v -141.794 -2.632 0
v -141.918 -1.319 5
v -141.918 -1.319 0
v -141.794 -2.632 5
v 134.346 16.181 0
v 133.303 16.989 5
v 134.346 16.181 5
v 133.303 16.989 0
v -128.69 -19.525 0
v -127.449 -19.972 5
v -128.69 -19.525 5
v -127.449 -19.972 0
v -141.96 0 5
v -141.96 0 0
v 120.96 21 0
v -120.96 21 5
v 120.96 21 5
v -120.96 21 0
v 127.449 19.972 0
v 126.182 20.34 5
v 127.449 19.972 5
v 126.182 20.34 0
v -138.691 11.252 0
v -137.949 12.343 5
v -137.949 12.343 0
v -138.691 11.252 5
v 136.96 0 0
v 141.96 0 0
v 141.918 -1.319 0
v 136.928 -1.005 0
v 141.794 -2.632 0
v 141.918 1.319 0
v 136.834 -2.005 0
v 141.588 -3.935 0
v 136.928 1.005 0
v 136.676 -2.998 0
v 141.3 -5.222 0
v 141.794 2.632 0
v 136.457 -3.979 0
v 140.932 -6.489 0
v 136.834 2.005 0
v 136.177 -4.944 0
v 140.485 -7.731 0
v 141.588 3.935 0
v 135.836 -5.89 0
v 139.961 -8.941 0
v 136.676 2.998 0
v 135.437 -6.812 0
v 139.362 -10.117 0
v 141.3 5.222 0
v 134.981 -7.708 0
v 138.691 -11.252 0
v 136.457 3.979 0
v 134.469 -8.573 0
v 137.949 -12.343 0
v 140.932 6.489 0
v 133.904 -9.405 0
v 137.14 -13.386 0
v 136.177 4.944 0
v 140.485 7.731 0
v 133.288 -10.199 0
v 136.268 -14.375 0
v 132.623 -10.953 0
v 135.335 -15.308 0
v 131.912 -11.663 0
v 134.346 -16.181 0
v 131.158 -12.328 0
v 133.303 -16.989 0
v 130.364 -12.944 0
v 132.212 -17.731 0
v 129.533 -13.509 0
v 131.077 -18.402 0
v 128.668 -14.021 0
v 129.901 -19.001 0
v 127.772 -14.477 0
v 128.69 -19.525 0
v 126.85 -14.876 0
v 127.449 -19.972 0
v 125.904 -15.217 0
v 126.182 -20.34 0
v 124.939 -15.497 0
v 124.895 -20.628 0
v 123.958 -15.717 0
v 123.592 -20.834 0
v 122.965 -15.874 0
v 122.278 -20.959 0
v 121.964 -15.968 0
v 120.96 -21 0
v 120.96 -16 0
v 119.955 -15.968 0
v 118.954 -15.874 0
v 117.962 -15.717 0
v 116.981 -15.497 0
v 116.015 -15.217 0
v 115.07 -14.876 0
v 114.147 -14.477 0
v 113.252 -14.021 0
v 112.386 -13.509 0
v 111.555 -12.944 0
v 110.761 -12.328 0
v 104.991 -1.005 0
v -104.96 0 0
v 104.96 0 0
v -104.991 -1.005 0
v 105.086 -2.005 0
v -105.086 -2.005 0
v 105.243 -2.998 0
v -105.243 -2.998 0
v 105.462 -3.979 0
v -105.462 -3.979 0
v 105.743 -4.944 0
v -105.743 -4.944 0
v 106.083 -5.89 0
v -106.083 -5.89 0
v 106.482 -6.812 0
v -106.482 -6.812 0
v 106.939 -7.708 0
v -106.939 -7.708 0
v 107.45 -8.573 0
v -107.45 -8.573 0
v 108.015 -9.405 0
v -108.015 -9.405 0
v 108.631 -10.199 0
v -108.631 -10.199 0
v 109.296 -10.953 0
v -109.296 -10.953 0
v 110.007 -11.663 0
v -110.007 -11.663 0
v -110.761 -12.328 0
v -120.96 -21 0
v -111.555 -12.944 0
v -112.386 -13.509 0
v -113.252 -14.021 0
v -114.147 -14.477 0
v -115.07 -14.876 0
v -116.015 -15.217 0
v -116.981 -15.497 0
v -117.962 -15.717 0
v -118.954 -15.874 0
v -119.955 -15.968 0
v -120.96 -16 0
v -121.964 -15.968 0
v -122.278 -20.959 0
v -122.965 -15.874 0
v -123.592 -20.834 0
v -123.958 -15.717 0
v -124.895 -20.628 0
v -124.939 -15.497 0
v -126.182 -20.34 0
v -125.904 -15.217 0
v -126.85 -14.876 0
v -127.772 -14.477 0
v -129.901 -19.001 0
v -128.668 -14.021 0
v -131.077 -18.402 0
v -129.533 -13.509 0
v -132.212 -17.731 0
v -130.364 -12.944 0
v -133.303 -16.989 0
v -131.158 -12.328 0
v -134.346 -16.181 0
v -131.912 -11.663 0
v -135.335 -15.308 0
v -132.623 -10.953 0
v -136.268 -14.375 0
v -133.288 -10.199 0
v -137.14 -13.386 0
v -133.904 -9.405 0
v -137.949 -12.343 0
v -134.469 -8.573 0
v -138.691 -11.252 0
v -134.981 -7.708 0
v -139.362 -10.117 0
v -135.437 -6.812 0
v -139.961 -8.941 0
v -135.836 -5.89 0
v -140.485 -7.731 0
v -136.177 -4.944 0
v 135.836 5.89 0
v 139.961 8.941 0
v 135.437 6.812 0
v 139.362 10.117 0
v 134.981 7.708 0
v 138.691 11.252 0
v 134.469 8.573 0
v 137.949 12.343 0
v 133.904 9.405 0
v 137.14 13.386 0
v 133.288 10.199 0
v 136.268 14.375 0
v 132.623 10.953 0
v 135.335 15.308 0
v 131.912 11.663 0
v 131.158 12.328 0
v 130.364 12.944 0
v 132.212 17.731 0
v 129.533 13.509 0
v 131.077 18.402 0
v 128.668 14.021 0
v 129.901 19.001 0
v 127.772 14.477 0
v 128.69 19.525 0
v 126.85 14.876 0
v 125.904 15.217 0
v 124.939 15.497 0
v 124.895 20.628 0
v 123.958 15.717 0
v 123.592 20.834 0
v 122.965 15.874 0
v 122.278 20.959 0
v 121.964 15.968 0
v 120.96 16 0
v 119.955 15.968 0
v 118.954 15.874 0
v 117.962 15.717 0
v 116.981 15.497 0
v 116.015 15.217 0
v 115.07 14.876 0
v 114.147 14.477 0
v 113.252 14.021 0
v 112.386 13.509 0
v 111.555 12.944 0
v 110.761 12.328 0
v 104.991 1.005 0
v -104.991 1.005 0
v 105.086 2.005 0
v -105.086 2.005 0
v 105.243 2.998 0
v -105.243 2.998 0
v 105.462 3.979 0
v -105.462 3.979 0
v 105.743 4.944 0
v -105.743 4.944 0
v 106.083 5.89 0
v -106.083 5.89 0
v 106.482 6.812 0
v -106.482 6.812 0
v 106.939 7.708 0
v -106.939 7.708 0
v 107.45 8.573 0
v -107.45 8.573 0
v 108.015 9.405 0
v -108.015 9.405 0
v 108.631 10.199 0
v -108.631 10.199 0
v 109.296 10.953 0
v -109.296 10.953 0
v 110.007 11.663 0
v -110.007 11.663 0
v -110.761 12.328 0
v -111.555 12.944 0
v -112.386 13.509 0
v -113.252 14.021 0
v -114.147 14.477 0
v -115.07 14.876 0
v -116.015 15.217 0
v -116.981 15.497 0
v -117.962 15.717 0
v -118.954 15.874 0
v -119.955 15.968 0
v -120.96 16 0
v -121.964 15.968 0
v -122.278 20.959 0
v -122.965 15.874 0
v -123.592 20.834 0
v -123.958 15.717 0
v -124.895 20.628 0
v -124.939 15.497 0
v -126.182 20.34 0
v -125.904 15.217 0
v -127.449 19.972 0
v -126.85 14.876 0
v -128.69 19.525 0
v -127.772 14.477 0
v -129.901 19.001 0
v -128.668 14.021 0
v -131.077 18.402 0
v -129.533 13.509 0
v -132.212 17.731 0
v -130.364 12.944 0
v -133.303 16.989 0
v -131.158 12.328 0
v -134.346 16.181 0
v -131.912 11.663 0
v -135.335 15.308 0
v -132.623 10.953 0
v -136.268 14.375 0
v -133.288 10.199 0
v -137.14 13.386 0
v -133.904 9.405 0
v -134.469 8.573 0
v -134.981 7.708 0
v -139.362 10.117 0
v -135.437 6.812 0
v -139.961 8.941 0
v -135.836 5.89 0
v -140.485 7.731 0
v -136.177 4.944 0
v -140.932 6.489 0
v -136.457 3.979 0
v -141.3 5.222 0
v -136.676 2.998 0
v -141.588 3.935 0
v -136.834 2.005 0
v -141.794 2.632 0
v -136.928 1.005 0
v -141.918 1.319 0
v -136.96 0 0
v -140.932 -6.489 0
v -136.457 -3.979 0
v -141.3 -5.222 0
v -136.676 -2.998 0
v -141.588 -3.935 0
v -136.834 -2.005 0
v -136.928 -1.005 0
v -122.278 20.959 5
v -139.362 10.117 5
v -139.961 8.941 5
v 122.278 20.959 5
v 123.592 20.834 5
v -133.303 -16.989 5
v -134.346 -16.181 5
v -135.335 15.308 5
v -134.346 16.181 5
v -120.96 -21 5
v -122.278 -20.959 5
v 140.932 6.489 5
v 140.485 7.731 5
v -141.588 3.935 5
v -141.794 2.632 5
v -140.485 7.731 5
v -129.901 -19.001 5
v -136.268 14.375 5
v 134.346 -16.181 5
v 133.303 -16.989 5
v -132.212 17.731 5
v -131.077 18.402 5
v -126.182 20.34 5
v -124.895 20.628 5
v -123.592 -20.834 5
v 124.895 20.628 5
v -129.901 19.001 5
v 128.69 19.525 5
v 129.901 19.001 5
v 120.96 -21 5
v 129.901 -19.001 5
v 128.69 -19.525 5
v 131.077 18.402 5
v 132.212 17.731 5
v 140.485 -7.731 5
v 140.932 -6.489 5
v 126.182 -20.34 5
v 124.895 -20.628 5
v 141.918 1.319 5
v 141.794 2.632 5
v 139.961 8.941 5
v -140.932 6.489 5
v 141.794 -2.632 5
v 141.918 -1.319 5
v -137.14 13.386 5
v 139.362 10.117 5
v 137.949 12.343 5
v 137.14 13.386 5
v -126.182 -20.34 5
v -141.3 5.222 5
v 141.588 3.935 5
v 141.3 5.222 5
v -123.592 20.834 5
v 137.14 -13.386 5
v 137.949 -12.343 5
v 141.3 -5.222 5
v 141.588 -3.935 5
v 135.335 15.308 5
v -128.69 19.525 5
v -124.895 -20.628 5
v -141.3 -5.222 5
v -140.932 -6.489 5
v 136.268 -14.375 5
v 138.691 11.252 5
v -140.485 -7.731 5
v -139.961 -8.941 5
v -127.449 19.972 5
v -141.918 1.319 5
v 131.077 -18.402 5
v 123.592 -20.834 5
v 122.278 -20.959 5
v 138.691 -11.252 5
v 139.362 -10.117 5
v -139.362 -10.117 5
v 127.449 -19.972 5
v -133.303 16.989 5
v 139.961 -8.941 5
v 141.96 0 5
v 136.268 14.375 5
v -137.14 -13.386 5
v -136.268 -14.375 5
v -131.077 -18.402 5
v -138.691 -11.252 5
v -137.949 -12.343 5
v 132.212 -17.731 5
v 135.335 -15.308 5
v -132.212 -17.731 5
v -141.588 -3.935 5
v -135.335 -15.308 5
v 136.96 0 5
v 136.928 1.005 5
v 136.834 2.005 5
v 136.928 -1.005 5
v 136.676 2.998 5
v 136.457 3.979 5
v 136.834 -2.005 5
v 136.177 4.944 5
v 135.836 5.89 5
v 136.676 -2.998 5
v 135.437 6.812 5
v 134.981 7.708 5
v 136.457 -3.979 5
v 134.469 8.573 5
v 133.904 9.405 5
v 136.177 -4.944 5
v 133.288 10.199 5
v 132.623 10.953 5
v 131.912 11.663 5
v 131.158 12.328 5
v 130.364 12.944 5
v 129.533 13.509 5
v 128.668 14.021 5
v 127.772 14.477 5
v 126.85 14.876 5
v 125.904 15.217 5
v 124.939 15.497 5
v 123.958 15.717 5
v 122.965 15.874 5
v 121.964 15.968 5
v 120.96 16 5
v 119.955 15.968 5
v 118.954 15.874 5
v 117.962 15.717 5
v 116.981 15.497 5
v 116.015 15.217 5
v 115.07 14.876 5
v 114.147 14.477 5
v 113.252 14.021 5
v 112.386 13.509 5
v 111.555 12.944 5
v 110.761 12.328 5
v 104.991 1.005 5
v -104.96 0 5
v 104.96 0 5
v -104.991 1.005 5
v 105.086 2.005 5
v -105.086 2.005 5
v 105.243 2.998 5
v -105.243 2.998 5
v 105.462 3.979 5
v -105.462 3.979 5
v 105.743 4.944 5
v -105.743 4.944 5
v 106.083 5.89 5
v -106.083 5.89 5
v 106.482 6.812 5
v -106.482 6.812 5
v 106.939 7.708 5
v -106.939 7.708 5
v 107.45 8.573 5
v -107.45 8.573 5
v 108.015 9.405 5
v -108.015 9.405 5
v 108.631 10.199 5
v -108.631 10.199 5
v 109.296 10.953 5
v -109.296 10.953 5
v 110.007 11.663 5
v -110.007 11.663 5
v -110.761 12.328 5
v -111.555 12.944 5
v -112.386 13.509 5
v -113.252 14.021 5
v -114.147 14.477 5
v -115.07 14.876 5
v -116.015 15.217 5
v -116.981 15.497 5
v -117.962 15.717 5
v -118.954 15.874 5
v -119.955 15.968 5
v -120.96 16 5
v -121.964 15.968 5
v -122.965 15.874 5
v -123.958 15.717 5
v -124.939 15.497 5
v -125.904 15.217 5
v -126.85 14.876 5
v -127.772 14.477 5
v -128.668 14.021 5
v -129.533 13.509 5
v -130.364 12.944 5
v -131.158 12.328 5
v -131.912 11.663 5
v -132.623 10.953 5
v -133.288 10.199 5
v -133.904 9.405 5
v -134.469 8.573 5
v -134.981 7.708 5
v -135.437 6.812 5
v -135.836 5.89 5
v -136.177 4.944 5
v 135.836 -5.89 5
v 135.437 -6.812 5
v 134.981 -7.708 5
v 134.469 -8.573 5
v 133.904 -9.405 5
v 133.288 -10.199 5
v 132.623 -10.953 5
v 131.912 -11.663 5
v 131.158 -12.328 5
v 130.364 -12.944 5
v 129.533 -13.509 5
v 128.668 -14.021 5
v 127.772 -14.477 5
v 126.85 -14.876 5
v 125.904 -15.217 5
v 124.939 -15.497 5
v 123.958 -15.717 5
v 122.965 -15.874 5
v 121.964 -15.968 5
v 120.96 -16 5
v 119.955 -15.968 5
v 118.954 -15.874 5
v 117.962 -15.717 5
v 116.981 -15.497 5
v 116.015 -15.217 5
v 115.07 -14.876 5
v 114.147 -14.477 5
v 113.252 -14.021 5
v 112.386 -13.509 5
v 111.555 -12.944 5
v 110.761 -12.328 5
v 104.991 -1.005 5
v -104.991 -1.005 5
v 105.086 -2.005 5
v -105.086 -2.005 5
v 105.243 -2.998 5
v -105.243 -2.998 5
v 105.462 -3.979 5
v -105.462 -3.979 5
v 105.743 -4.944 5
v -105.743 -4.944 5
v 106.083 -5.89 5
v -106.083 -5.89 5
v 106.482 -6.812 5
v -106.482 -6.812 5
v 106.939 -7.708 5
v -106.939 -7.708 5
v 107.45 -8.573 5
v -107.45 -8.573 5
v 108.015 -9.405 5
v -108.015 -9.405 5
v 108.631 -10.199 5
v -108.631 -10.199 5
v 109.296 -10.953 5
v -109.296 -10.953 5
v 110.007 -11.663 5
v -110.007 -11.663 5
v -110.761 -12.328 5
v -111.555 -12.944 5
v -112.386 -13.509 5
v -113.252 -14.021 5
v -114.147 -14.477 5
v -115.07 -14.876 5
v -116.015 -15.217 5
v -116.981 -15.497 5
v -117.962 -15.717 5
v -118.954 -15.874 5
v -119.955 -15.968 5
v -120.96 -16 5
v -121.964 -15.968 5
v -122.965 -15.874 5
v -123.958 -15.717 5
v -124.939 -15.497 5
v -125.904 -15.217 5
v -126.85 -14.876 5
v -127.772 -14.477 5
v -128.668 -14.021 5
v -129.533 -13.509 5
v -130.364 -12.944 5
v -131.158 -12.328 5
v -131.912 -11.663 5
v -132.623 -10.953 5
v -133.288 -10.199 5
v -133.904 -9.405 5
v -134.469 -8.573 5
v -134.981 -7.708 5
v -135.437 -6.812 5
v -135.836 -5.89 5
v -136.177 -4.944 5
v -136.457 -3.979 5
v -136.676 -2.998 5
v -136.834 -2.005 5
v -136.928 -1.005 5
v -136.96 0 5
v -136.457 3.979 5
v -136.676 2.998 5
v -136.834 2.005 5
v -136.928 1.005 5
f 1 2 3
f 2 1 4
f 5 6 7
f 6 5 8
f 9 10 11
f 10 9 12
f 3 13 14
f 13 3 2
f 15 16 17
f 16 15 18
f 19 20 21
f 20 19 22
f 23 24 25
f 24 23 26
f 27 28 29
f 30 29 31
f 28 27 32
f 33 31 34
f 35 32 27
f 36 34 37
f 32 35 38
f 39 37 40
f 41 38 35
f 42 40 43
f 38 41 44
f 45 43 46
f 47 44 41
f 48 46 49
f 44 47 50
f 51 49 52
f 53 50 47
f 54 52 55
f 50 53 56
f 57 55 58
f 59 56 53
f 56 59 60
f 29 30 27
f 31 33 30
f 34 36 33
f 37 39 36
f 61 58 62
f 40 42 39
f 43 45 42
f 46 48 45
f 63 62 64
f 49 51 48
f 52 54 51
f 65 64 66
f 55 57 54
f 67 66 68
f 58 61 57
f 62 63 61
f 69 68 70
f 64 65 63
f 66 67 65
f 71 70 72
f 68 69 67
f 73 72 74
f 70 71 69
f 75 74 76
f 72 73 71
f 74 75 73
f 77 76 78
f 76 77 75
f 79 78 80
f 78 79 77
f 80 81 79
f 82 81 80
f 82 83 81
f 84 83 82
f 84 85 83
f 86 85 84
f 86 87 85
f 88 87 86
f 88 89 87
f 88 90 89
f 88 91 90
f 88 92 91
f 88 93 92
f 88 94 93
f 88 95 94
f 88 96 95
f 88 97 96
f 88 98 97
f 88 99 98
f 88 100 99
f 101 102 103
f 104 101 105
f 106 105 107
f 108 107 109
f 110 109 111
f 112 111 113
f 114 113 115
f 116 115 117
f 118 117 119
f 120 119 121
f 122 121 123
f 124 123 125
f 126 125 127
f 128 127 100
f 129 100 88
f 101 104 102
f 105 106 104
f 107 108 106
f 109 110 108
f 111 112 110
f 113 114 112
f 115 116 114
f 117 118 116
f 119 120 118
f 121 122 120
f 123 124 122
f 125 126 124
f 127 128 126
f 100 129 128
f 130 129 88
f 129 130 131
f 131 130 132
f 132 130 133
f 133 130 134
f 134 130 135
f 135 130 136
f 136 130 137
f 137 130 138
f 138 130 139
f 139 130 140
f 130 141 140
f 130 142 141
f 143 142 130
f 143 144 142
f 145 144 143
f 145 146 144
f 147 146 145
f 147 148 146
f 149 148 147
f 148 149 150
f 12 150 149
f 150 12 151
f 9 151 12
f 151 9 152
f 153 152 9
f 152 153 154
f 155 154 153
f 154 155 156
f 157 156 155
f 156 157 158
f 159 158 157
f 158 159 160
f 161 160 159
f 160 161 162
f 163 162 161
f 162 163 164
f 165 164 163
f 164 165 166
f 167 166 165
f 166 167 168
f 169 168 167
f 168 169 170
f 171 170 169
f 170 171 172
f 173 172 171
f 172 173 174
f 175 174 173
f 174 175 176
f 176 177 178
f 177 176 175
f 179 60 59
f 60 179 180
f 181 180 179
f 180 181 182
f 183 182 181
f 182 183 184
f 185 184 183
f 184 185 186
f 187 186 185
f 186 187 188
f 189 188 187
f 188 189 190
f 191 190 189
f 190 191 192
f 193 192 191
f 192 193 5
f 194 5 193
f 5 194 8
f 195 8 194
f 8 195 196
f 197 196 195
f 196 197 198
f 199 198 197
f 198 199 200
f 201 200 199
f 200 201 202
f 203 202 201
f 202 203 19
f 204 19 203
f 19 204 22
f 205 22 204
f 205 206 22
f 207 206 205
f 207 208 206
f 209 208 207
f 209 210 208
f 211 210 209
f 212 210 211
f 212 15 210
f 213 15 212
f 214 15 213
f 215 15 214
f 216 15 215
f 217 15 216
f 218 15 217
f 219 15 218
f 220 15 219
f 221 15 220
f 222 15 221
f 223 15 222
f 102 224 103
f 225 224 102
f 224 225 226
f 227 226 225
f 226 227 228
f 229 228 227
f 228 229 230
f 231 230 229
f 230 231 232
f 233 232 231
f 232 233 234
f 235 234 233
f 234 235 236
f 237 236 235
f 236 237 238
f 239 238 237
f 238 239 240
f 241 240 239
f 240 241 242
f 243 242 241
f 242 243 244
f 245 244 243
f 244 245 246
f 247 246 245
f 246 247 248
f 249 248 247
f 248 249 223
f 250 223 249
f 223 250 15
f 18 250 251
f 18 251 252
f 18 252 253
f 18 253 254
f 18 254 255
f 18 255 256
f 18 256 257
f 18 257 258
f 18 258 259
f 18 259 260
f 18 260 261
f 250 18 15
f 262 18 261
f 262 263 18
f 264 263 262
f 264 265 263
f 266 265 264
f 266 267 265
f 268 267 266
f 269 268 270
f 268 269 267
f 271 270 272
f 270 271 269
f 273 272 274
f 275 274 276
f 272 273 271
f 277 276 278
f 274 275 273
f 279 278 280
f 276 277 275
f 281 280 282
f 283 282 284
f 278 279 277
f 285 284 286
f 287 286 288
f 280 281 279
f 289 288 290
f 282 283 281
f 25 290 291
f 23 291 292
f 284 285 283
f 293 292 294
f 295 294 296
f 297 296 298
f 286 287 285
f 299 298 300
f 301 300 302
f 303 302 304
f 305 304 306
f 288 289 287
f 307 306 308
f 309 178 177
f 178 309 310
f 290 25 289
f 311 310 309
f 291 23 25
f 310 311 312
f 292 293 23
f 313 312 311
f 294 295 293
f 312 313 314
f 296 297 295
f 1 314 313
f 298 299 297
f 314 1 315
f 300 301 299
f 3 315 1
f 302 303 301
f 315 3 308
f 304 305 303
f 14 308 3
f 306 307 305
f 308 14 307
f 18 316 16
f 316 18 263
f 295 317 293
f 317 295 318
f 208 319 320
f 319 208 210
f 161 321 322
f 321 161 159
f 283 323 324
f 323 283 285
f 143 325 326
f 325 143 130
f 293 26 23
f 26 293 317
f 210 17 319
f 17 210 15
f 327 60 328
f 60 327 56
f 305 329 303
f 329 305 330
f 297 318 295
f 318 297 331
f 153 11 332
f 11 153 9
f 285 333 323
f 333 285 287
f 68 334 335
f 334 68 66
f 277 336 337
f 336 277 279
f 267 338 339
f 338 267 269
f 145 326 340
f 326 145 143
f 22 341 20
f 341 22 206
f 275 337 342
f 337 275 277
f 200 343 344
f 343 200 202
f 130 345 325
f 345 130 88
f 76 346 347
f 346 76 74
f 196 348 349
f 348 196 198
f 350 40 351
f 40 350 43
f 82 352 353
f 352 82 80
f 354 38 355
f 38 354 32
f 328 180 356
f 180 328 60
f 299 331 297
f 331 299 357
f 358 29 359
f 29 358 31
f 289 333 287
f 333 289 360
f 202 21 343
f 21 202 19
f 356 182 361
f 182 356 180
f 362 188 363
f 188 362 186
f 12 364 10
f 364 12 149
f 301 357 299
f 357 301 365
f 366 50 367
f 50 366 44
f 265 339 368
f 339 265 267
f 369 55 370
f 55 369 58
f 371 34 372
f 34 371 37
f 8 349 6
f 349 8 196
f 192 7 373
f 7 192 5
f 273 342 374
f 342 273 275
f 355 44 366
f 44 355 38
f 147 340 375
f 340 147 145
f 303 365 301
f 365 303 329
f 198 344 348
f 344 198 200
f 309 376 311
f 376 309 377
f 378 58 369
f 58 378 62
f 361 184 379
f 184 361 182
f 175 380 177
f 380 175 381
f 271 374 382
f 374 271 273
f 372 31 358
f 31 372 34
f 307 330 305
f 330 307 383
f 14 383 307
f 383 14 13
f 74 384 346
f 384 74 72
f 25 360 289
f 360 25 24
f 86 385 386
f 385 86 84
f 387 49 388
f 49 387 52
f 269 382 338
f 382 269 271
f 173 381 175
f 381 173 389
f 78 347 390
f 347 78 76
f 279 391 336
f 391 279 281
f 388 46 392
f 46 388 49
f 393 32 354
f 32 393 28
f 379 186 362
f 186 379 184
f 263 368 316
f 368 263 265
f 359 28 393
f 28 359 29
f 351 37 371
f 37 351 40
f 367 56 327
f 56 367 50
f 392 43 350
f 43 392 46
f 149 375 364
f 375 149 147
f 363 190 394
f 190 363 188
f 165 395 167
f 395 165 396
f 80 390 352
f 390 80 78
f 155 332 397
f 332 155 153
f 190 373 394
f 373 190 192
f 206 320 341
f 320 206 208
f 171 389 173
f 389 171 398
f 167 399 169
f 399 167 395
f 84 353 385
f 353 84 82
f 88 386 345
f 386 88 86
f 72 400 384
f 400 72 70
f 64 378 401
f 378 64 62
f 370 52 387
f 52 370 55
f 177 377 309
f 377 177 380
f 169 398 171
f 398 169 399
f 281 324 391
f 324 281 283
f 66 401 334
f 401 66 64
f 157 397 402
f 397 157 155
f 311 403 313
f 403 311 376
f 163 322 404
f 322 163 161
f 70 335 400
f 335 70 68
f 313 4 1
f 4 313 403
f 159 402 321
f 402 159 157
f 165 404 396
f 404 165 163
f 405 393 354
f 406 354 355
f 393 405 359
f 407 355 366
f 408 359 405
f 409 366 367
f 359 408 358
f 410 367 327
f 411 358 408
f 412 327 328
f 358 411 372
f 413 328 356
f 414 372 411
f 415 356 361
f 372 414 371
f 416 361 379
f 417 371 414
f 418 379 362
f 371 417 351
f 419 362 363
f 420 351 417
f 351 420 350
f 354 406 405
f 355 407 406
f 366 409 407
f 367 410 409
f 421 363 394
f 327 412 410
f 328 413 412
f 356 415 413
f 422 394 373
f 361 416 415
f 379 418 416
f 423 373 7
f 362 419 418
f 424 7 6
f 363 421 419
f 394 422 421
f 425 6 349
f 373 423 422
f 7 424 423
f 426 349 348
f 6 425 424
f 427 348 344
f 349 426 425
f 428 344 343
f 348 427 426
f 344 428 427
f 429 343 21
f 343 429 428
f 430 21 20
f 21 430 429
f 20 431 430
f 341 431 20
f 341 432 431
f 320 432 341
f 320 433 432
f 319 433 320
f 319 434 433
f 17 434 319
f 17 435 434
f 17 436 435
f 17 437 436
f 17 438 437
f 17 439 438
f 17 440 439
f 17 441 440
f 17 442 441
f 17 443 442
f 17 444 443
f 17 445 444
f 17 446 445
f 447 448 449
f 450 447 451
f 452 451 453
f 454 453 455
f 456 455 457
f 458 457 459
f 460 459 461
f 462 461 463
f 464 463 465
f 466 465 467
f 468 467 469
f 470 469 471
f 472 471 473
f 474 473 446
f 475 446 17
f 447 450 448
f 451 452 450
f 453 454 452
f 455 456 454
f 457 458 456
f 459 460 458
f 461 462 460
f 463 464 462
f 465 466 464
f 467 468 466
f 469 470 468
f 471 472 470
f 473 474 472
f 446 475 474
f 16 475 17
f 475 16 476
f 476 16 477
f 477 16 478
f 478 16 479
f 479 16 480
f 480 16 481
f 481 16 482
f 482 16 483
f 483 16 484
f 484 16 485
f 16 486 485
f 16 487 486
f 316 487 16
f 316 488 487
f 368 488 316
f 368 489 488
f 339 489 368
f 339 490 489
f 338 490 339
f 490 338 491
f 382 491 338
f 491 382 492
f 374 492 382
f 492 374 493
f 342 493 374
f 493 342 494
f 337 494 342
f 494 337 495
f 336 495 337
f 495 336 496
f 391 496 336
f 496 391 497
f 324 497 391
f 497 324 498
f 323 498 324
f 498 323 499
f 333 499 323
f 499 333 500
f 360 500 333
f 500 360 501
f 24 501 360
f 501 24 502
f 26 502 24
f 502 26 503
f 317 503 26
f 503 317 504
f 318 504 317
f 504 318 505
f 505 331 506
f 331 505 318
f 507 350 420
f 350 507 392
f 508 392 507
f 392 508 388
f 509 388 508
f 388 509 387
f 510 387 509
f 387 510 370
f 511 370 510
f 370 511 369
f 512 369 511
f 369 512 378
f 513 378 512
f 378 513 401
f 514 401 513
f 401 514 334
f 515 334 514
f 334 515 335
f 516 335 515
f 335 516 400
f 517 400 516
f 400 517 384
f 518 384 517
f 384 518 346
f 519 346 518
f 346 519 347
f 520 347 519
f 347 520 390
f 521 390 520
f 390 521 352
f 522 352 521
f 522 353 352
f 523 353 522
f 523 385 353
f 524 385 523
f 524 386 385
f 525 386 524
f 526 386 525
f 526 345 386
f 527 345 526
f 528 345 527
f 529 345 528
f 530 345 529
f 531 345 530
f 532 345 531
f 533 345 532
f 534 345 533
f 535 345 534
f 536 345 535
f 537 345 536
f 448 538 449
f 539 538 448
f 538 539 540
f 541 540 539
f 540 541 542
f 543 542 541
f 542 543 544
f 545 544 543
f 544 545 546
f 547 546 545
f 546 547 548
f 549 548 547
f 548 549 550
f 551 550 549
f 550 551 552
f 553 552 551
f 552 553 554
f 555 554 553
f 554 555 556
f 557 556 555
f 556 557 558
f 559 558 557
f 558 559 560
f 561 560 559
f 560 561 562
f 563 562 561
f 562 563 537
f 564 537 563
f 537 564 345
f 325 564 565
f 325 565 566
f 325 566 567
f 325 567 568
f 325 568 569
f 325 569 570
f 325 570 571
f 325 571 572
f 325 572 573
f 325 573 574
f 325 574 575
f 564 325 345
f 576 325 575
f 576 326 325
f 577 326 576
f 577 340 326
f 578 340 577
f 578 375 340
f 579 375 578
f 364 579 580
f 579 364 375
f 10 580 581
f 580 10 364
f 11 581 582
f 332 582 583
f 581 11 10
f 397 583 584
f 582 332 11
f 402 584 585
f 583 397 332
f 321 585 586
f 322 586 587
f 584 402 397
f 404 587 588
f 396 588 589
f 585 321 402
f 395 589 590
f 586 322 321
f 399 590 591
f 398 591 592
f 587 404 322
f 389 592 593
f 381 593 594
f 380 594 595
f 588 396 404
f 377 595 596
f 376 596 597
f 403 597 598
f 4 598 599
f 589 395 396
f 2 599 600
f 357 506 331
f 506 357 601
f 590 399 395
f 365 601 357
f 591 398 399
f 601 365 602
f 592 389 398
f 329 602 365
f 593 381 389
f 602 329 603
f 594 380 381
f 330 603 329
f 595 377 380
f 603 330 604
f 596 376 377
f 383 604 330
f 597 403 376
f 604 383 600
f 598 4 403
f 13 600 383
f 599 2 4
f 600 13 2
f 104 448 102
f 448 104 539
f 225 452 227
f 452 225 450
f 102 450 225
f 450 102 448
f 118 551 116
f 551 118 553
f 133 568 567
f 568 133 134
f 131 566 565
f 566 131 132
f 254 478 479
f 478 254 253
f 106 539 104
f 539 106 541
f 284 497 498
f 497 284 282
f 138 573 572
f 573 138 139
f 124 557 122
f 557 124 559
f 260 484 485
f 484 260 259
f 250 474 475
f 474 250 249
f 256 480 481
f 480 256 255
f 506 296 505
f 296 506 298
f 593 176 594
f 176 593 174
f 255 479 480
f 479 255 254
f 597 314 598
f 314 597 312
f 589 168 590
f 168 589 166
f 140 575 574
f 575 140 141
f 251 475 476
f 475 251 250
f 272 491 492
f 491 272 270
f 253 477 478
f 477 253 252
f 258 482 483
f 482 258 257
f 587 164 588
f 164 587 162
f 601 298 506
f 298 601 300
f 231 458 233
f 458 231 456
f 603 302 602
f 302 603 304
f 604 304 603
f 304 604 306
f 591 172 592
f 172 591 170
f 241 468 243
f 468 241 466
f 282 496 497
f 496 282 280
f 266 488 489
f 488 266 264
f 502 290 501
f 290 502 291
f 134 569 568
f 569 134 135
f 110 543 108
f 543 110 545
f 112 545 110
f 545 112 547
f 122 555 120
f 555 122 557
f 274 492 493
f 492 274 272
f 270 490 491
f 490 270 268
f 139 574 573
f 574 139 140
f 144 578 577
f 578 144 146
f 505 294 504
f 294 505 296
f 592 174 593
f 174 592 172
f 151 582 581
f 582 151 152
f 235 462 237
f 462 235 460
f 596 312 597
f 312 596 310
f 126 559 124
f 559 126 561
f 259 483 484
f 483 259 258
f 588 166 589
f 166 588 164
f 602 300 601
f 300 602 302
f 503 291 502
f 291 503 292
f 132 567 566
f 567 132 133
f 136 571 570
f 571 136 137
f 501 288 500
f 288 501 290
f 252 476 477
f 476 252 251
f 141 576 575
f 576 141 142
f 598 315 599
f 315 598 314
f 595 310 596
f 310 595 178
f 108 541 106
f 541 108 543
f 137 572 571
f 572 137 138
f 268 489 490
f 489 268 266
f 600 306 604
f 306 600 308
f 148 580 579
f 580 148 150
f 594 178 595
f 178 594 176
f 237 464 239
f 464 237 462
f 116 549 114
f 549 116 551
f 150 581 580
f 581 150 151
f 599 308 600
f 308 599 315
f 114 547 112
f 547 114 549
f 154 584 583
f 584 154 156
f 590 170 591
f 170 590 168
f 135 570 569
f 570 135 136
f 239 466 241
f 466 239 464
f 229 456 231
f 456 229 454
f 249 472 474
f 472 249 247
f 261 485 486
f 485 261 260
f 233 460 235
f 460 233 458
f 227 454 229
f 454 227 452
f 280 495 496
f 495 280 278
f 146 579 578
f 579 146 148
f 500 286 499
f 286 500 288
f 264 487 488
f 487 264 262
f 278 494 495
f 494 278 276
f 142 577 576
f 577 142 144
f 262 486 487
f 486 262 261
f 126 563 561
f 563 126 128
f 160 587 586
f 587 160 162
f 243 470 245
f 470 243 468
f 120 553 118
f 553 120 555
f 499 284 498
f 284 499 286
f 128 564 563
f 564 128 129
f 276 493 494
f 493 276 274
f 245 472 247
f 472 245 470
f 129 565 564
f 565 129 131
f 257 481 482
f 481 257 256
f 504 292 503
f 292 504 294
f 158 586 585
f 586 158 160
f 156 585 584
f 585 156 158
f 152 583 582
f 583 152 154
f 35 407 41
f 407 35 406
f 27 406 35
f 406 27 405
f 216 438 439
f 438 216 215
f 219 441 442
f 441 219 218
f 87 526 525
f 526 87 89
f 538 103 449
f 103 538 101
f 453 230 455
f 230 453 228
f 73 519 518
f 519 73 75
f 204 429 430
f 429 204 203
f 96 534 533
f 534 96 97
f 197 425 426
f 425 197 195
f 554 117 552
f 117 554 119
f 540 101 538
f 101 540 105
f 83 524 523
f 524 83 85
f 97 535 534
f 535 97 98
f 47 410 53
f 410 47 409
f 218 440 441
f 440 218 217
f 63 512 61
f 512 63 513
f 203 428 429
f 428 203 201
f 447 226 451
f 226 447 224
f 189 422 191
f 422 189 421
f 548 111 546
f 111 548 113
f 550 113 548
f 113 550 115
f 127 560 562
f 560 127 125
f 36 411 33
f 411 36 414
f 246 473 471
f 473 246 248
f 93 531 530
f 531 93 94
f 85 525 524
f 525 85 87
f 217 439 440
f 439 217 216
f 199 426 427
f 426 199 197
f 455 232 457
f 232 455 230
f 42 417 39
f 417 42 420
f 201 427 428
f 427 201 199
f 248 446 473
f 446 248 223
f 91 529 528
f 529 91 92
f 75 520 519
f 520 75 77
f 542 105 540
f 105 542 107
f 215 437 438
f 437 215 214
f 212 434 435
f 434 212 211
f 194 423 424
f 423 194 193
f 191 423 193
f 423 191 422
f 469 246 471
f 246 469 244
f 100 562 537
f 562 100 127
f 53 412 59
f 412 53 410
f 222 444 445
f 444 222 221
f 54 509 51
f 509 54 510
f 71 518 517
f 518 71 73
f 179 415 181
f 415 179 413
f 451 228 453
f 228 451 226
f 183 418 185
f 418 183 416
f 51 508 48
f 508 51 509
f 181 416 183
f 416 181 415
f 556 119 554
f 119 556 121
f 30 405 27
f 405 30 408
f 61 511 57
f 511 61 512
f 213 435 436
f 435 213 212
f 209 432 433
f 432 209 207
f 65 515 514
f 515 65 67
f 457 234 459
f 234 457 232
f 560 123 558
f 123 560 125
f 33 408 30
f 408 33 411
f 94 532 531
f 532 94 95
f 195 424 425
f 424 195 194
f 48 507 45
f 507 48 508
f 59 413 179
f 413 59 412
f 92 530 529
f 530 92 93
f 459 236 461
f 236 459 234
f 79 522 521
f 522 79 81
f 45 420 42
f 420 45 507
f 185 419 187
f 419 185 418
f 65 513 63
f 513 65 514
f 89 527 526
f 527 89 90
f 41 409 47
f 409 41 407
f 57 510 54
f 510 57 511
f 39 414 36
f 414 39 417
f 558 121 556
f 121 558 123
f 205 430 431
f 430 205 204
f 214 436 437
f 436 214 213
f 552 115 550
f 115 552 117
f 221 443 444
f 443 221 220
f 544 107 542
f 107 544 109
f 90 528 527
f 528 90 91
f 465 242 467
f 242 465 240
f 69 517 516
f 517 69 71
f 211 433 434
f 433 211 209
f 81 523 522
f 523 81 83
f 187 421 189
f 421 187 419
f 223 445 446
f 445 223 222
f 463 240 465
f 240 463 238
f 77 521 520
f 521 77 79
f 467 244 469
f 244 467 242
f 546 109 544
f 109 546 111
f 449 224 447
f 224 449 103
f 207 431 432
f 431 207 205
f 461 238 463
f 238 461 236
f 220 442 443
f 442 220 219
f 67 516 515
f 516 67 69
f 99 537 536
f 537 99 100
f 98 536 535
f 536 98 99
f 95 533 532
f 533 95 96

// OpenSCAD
// SPDX-License-Identifier: CC-BY-4.0
// SPDX-FileCopyrightText: 2026 Todd Sayre
// ============================================================
// Turn-N-Tube shelf brace — diagonal triangulating link
// The third link that makes two adjacent shelf units rigid.
//
// Two couplers at one level do not hold the units still. Each
// is pinned at both ends by a round tube in a round hole, so
// the pair forms a four-bar linkage: one degree of freedom, no
// matter how stiff the couplers are or how far apart they sit.
// The units stay parallel and shear sideways. That is
// kinematic, not a stiffness problem, which is why the
// coupler's old gap-filling wall never fixed it — friction was
// all it had.
//
// Two rigid bodies have three degrees of freedom in plan and
// each link removes one, so three links lock them together.
// This brace is the third. It runs diagonally from one unit's
// FRONT post to the other unit's BACK post, so it is not
// parallel to the couplers and takes away the freedom they
// leave behind.
//
// Three links is the entire requirement. One brace anywhere in
// the stack makes the pair rigid; couplers at the other levels
// only add stiffness.
//
// PRINT NOTES:
// - Modelled as a straight bar. The diagonal is where it goes,
//   not what it is.
// - Long. It always goes on the bed turned 45 degrees, which
//   is the only way the shipped length fits at all; the echoed
//   bed placement gives the square it needs.
// - PETG, no supports, flat on the bed. Flat runs the
//   perimeters along the load path; on edge would load the
//   part across its layers.
// - It shares posts with the couplers at whichever level it
//   goes on, resting on one at each end, so it sits level a
//   coupler's height above the shelf.
// - One per pair of units, not one per level.
// ============================================================

// MARK: Dimensions

// Measure the shelves
tube_od = 30; // mm
tube_to_edge = 20; // mm, tube to its shelf's facing edge
post_clear_gap = 200; // mm, between one unit's posts, smallest reading
brace_clear_gap = undef; // mm, diagonal gap if measured; undef derives it
// (tube_to_edge and shelf_gap must match the couplers)

// Override only if the two units differ
left_tube_to_edge = tube_to_edge; // mm
right_tube_to_edge = tube_to_edge; // mm

// Gap between the units' facing shelf edges
shelf_gap = 5; // mm

// MARK: Tuning

hole_clearance = 2; // mm, looser than the coupler's on purpose
wall_meat = 5; // mm, around each hole
brace_height = 5; // mm, match the coupler so it stacks flat
bed_size = 256; // mm, print bed's short side
bed_margin = 6; // mm, at each bed edge for brim and skirt

$fn = 100;

// MARK: Derived

// Across the gap: half a tube, the run out to each shelf edge, and the gap.
// Identical to the coupler's own hole spacing, by construction
across_center_distance = tube_od + left_tube_to_edge + shelf_gap + right_tube_to_edge;

// Front to back along one unit, centre to centre. The clear gap misses one
// tube radius at each end, so a whole diameter goes back on
depth_center_distance = post_clear_gap + tube_od;

// The diagonal itself: front post of one unit to back post of the other
derived_brace_distance = sqrt(across_center_distance * across_center_distance + depth_center_distance * depth_center_distance);
brace_center_distance = is_undef(brace_clear_gap) ? derived_brace_distance : brace_clear_gap + tube_od;

hole_r = tube_od / 2 + hole_clearance / 2;
collar_r = hole_r + wall_meat;

overall_length = brace_center_distance + 2 * collar_r;
overall_width = 2 * collar_r;

// Square bed requirement at 45 degrees, taken from the rounded bar silhouette
// rather than from its bounding box: the projected centre spacing plus the
// unchanged diameter of the round ends. Turning the bounding box instead counts
// corners a stadium never occupies and overstates the square by about 17 mm on
// the shipped dimensions
//
// There is no square-on case to choose between. A stadium always fits a smaller
// square turned, since the projected centre spacing is shorter than the spacing
// itself for every length the hole-overlap assert below leaves standing, so the
// angle is 45 whatever the parameters are set to
bed_square = brace_center_distance / sqrt(2) + 2 * collar_r;
bed_angle = 45;

// MARK: Checks

echo(str("across-the-gap hole spacing = ", across_center_distance, " mm"));
echo(str("front-to-back hole spacing = ", depth_center_distance, " mm"));
echo(str("brace hole spacing = ", brace_center_distance, " mm"));
echo(str("overall size = ", overall_length, " x ", overall_width, " mm"));
echo(str("bed placement = ", bed_angle, " deg, needs a ", bed_square, " mm square"));

assert(post_clear_gap > 0, "post_clear_gap is the open space between the two posts, not a span across them — measure inner face to inner face");
assert(brace_center_distance > 2 * hole_r, "the two holes overlap — check post_clear_gap and shelf_gap");
assert(bed_square <= bed_size - 2 * bed_margin, "brace does not fit the print bed — see the echoed bed placement, and split it into two bolted halves if the units really are this deep");

// MARK: Geometry

// 2D lozenge (stadium) shape: hull of two circles. Duplicated from
// shelf_tube_coupler.scad rather than shared, because every source here is
// meant to stand on its own
module lozenge_2d(r, cdist) {
  hull() {
    translate([-cdist / 2, 0])
      circle(r = r);
    translate([cdist / 2, 0])
      circle(r = r);
  }
}

module brace() {
  difference() {
    linear_extrude(height = brace_height)
      lozenge_2d(collar_r, brace_center_distance);

    // Through-holes for the two tube posts
    translate([-brace_center_distance / 2, 0, -1])
      cylinder(r = hole_r, h = brace_height + 2);
    translate([brace_center_distance / 2, 0, -1])
      cylinder(r = hole_r, h = brace_height + 2);
  }
}

brace();
